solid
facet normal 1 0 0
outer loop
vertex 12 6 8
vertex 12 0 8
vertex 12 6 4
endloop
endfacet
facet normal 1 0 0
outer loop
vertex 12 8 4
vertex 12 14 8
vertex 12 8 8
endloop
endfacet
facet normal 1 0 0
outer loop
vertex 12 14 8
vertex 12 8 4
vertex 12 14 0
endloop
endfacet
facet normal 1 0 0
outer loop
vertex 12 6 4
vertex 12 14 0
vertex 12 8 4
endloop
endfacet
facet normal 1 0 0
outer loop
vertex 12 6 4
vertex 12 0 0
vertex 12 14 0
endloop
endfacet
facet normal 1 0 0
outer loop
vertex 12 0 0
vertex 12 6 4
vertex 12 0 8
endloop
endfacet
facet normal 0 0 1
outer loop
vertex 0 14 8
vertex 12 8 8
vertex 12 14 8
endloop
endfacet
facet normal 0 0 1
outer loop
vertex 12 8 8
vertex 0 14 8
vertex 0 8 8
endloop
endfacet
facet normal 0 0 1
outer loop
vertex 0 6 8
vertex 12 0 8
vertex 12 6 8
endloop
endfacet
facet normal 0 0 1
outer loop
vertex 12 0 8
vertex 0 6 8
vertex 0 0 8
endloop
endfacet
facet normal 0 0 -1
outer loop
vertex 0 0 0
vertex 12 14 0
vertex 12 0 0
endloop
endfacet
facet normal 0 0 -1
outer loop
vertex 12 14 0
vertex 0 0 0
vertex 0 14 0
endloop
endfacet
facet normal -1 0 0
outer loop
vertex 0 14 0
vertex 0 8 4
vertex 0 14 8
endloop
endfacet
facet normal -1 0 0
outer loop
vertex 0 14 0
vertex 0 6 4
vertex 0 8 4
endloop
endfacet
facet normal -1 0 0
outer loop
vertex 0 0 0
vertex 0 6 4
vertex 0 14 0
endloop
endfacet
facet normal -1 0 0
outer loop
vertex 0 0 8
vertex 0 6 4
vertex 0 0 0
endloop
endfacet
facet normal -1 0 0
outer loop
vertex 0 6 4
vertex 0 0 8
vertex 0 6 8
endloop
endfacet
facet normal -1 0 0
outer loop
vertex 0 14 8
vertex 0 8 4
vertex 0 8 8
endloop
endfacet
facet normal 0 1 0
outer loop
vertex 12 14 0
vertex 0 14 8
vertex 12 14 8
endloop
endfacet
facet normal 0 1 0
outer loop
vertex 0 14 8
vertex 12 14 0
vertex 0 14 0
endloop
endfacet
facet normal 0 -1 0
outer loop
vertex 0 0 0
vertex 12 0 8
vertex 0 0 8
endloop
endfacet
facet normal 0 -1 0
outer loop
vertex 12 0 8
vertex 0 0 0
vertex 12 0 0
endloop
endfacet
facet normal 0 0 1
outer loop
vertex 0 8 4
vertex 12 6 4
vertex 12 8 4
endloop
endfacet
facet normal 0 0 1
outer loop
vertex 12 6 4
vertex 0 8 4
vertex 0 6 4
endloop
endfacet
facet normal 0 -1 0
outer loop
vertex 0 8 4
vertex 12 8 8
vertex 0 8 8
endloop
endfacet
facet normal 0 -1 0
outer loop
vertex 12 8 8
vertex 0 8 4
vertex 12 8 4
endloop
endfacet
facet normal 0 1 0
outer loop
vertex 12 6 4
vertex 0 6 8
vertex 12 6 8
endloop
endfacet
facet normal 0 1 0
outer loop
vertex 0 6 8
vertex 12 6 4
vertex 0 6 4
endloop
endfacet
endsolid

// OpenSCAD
$fn = 32;

// ----------------------------------------------------------------------
// Micro clip: slotted block, 5-20 mm class
// ----------------------------------------------------------------------

// --- parameters (mm) ---
block_l = 12;             // block length, X
block_w = 14;             // block width, Y
block_h = 8;              // block height, Z
slot_w = 2;               // slot width
slot_d = 4;               // slot depth from the top

difference() {
  cube([block_l, block_w, block_h]);
  translate([-1, block_w / 2 - slot_w / 2, block_h - slot_d])
    cube([block_l + 2, slot_w, slot_d + 1]);
}
